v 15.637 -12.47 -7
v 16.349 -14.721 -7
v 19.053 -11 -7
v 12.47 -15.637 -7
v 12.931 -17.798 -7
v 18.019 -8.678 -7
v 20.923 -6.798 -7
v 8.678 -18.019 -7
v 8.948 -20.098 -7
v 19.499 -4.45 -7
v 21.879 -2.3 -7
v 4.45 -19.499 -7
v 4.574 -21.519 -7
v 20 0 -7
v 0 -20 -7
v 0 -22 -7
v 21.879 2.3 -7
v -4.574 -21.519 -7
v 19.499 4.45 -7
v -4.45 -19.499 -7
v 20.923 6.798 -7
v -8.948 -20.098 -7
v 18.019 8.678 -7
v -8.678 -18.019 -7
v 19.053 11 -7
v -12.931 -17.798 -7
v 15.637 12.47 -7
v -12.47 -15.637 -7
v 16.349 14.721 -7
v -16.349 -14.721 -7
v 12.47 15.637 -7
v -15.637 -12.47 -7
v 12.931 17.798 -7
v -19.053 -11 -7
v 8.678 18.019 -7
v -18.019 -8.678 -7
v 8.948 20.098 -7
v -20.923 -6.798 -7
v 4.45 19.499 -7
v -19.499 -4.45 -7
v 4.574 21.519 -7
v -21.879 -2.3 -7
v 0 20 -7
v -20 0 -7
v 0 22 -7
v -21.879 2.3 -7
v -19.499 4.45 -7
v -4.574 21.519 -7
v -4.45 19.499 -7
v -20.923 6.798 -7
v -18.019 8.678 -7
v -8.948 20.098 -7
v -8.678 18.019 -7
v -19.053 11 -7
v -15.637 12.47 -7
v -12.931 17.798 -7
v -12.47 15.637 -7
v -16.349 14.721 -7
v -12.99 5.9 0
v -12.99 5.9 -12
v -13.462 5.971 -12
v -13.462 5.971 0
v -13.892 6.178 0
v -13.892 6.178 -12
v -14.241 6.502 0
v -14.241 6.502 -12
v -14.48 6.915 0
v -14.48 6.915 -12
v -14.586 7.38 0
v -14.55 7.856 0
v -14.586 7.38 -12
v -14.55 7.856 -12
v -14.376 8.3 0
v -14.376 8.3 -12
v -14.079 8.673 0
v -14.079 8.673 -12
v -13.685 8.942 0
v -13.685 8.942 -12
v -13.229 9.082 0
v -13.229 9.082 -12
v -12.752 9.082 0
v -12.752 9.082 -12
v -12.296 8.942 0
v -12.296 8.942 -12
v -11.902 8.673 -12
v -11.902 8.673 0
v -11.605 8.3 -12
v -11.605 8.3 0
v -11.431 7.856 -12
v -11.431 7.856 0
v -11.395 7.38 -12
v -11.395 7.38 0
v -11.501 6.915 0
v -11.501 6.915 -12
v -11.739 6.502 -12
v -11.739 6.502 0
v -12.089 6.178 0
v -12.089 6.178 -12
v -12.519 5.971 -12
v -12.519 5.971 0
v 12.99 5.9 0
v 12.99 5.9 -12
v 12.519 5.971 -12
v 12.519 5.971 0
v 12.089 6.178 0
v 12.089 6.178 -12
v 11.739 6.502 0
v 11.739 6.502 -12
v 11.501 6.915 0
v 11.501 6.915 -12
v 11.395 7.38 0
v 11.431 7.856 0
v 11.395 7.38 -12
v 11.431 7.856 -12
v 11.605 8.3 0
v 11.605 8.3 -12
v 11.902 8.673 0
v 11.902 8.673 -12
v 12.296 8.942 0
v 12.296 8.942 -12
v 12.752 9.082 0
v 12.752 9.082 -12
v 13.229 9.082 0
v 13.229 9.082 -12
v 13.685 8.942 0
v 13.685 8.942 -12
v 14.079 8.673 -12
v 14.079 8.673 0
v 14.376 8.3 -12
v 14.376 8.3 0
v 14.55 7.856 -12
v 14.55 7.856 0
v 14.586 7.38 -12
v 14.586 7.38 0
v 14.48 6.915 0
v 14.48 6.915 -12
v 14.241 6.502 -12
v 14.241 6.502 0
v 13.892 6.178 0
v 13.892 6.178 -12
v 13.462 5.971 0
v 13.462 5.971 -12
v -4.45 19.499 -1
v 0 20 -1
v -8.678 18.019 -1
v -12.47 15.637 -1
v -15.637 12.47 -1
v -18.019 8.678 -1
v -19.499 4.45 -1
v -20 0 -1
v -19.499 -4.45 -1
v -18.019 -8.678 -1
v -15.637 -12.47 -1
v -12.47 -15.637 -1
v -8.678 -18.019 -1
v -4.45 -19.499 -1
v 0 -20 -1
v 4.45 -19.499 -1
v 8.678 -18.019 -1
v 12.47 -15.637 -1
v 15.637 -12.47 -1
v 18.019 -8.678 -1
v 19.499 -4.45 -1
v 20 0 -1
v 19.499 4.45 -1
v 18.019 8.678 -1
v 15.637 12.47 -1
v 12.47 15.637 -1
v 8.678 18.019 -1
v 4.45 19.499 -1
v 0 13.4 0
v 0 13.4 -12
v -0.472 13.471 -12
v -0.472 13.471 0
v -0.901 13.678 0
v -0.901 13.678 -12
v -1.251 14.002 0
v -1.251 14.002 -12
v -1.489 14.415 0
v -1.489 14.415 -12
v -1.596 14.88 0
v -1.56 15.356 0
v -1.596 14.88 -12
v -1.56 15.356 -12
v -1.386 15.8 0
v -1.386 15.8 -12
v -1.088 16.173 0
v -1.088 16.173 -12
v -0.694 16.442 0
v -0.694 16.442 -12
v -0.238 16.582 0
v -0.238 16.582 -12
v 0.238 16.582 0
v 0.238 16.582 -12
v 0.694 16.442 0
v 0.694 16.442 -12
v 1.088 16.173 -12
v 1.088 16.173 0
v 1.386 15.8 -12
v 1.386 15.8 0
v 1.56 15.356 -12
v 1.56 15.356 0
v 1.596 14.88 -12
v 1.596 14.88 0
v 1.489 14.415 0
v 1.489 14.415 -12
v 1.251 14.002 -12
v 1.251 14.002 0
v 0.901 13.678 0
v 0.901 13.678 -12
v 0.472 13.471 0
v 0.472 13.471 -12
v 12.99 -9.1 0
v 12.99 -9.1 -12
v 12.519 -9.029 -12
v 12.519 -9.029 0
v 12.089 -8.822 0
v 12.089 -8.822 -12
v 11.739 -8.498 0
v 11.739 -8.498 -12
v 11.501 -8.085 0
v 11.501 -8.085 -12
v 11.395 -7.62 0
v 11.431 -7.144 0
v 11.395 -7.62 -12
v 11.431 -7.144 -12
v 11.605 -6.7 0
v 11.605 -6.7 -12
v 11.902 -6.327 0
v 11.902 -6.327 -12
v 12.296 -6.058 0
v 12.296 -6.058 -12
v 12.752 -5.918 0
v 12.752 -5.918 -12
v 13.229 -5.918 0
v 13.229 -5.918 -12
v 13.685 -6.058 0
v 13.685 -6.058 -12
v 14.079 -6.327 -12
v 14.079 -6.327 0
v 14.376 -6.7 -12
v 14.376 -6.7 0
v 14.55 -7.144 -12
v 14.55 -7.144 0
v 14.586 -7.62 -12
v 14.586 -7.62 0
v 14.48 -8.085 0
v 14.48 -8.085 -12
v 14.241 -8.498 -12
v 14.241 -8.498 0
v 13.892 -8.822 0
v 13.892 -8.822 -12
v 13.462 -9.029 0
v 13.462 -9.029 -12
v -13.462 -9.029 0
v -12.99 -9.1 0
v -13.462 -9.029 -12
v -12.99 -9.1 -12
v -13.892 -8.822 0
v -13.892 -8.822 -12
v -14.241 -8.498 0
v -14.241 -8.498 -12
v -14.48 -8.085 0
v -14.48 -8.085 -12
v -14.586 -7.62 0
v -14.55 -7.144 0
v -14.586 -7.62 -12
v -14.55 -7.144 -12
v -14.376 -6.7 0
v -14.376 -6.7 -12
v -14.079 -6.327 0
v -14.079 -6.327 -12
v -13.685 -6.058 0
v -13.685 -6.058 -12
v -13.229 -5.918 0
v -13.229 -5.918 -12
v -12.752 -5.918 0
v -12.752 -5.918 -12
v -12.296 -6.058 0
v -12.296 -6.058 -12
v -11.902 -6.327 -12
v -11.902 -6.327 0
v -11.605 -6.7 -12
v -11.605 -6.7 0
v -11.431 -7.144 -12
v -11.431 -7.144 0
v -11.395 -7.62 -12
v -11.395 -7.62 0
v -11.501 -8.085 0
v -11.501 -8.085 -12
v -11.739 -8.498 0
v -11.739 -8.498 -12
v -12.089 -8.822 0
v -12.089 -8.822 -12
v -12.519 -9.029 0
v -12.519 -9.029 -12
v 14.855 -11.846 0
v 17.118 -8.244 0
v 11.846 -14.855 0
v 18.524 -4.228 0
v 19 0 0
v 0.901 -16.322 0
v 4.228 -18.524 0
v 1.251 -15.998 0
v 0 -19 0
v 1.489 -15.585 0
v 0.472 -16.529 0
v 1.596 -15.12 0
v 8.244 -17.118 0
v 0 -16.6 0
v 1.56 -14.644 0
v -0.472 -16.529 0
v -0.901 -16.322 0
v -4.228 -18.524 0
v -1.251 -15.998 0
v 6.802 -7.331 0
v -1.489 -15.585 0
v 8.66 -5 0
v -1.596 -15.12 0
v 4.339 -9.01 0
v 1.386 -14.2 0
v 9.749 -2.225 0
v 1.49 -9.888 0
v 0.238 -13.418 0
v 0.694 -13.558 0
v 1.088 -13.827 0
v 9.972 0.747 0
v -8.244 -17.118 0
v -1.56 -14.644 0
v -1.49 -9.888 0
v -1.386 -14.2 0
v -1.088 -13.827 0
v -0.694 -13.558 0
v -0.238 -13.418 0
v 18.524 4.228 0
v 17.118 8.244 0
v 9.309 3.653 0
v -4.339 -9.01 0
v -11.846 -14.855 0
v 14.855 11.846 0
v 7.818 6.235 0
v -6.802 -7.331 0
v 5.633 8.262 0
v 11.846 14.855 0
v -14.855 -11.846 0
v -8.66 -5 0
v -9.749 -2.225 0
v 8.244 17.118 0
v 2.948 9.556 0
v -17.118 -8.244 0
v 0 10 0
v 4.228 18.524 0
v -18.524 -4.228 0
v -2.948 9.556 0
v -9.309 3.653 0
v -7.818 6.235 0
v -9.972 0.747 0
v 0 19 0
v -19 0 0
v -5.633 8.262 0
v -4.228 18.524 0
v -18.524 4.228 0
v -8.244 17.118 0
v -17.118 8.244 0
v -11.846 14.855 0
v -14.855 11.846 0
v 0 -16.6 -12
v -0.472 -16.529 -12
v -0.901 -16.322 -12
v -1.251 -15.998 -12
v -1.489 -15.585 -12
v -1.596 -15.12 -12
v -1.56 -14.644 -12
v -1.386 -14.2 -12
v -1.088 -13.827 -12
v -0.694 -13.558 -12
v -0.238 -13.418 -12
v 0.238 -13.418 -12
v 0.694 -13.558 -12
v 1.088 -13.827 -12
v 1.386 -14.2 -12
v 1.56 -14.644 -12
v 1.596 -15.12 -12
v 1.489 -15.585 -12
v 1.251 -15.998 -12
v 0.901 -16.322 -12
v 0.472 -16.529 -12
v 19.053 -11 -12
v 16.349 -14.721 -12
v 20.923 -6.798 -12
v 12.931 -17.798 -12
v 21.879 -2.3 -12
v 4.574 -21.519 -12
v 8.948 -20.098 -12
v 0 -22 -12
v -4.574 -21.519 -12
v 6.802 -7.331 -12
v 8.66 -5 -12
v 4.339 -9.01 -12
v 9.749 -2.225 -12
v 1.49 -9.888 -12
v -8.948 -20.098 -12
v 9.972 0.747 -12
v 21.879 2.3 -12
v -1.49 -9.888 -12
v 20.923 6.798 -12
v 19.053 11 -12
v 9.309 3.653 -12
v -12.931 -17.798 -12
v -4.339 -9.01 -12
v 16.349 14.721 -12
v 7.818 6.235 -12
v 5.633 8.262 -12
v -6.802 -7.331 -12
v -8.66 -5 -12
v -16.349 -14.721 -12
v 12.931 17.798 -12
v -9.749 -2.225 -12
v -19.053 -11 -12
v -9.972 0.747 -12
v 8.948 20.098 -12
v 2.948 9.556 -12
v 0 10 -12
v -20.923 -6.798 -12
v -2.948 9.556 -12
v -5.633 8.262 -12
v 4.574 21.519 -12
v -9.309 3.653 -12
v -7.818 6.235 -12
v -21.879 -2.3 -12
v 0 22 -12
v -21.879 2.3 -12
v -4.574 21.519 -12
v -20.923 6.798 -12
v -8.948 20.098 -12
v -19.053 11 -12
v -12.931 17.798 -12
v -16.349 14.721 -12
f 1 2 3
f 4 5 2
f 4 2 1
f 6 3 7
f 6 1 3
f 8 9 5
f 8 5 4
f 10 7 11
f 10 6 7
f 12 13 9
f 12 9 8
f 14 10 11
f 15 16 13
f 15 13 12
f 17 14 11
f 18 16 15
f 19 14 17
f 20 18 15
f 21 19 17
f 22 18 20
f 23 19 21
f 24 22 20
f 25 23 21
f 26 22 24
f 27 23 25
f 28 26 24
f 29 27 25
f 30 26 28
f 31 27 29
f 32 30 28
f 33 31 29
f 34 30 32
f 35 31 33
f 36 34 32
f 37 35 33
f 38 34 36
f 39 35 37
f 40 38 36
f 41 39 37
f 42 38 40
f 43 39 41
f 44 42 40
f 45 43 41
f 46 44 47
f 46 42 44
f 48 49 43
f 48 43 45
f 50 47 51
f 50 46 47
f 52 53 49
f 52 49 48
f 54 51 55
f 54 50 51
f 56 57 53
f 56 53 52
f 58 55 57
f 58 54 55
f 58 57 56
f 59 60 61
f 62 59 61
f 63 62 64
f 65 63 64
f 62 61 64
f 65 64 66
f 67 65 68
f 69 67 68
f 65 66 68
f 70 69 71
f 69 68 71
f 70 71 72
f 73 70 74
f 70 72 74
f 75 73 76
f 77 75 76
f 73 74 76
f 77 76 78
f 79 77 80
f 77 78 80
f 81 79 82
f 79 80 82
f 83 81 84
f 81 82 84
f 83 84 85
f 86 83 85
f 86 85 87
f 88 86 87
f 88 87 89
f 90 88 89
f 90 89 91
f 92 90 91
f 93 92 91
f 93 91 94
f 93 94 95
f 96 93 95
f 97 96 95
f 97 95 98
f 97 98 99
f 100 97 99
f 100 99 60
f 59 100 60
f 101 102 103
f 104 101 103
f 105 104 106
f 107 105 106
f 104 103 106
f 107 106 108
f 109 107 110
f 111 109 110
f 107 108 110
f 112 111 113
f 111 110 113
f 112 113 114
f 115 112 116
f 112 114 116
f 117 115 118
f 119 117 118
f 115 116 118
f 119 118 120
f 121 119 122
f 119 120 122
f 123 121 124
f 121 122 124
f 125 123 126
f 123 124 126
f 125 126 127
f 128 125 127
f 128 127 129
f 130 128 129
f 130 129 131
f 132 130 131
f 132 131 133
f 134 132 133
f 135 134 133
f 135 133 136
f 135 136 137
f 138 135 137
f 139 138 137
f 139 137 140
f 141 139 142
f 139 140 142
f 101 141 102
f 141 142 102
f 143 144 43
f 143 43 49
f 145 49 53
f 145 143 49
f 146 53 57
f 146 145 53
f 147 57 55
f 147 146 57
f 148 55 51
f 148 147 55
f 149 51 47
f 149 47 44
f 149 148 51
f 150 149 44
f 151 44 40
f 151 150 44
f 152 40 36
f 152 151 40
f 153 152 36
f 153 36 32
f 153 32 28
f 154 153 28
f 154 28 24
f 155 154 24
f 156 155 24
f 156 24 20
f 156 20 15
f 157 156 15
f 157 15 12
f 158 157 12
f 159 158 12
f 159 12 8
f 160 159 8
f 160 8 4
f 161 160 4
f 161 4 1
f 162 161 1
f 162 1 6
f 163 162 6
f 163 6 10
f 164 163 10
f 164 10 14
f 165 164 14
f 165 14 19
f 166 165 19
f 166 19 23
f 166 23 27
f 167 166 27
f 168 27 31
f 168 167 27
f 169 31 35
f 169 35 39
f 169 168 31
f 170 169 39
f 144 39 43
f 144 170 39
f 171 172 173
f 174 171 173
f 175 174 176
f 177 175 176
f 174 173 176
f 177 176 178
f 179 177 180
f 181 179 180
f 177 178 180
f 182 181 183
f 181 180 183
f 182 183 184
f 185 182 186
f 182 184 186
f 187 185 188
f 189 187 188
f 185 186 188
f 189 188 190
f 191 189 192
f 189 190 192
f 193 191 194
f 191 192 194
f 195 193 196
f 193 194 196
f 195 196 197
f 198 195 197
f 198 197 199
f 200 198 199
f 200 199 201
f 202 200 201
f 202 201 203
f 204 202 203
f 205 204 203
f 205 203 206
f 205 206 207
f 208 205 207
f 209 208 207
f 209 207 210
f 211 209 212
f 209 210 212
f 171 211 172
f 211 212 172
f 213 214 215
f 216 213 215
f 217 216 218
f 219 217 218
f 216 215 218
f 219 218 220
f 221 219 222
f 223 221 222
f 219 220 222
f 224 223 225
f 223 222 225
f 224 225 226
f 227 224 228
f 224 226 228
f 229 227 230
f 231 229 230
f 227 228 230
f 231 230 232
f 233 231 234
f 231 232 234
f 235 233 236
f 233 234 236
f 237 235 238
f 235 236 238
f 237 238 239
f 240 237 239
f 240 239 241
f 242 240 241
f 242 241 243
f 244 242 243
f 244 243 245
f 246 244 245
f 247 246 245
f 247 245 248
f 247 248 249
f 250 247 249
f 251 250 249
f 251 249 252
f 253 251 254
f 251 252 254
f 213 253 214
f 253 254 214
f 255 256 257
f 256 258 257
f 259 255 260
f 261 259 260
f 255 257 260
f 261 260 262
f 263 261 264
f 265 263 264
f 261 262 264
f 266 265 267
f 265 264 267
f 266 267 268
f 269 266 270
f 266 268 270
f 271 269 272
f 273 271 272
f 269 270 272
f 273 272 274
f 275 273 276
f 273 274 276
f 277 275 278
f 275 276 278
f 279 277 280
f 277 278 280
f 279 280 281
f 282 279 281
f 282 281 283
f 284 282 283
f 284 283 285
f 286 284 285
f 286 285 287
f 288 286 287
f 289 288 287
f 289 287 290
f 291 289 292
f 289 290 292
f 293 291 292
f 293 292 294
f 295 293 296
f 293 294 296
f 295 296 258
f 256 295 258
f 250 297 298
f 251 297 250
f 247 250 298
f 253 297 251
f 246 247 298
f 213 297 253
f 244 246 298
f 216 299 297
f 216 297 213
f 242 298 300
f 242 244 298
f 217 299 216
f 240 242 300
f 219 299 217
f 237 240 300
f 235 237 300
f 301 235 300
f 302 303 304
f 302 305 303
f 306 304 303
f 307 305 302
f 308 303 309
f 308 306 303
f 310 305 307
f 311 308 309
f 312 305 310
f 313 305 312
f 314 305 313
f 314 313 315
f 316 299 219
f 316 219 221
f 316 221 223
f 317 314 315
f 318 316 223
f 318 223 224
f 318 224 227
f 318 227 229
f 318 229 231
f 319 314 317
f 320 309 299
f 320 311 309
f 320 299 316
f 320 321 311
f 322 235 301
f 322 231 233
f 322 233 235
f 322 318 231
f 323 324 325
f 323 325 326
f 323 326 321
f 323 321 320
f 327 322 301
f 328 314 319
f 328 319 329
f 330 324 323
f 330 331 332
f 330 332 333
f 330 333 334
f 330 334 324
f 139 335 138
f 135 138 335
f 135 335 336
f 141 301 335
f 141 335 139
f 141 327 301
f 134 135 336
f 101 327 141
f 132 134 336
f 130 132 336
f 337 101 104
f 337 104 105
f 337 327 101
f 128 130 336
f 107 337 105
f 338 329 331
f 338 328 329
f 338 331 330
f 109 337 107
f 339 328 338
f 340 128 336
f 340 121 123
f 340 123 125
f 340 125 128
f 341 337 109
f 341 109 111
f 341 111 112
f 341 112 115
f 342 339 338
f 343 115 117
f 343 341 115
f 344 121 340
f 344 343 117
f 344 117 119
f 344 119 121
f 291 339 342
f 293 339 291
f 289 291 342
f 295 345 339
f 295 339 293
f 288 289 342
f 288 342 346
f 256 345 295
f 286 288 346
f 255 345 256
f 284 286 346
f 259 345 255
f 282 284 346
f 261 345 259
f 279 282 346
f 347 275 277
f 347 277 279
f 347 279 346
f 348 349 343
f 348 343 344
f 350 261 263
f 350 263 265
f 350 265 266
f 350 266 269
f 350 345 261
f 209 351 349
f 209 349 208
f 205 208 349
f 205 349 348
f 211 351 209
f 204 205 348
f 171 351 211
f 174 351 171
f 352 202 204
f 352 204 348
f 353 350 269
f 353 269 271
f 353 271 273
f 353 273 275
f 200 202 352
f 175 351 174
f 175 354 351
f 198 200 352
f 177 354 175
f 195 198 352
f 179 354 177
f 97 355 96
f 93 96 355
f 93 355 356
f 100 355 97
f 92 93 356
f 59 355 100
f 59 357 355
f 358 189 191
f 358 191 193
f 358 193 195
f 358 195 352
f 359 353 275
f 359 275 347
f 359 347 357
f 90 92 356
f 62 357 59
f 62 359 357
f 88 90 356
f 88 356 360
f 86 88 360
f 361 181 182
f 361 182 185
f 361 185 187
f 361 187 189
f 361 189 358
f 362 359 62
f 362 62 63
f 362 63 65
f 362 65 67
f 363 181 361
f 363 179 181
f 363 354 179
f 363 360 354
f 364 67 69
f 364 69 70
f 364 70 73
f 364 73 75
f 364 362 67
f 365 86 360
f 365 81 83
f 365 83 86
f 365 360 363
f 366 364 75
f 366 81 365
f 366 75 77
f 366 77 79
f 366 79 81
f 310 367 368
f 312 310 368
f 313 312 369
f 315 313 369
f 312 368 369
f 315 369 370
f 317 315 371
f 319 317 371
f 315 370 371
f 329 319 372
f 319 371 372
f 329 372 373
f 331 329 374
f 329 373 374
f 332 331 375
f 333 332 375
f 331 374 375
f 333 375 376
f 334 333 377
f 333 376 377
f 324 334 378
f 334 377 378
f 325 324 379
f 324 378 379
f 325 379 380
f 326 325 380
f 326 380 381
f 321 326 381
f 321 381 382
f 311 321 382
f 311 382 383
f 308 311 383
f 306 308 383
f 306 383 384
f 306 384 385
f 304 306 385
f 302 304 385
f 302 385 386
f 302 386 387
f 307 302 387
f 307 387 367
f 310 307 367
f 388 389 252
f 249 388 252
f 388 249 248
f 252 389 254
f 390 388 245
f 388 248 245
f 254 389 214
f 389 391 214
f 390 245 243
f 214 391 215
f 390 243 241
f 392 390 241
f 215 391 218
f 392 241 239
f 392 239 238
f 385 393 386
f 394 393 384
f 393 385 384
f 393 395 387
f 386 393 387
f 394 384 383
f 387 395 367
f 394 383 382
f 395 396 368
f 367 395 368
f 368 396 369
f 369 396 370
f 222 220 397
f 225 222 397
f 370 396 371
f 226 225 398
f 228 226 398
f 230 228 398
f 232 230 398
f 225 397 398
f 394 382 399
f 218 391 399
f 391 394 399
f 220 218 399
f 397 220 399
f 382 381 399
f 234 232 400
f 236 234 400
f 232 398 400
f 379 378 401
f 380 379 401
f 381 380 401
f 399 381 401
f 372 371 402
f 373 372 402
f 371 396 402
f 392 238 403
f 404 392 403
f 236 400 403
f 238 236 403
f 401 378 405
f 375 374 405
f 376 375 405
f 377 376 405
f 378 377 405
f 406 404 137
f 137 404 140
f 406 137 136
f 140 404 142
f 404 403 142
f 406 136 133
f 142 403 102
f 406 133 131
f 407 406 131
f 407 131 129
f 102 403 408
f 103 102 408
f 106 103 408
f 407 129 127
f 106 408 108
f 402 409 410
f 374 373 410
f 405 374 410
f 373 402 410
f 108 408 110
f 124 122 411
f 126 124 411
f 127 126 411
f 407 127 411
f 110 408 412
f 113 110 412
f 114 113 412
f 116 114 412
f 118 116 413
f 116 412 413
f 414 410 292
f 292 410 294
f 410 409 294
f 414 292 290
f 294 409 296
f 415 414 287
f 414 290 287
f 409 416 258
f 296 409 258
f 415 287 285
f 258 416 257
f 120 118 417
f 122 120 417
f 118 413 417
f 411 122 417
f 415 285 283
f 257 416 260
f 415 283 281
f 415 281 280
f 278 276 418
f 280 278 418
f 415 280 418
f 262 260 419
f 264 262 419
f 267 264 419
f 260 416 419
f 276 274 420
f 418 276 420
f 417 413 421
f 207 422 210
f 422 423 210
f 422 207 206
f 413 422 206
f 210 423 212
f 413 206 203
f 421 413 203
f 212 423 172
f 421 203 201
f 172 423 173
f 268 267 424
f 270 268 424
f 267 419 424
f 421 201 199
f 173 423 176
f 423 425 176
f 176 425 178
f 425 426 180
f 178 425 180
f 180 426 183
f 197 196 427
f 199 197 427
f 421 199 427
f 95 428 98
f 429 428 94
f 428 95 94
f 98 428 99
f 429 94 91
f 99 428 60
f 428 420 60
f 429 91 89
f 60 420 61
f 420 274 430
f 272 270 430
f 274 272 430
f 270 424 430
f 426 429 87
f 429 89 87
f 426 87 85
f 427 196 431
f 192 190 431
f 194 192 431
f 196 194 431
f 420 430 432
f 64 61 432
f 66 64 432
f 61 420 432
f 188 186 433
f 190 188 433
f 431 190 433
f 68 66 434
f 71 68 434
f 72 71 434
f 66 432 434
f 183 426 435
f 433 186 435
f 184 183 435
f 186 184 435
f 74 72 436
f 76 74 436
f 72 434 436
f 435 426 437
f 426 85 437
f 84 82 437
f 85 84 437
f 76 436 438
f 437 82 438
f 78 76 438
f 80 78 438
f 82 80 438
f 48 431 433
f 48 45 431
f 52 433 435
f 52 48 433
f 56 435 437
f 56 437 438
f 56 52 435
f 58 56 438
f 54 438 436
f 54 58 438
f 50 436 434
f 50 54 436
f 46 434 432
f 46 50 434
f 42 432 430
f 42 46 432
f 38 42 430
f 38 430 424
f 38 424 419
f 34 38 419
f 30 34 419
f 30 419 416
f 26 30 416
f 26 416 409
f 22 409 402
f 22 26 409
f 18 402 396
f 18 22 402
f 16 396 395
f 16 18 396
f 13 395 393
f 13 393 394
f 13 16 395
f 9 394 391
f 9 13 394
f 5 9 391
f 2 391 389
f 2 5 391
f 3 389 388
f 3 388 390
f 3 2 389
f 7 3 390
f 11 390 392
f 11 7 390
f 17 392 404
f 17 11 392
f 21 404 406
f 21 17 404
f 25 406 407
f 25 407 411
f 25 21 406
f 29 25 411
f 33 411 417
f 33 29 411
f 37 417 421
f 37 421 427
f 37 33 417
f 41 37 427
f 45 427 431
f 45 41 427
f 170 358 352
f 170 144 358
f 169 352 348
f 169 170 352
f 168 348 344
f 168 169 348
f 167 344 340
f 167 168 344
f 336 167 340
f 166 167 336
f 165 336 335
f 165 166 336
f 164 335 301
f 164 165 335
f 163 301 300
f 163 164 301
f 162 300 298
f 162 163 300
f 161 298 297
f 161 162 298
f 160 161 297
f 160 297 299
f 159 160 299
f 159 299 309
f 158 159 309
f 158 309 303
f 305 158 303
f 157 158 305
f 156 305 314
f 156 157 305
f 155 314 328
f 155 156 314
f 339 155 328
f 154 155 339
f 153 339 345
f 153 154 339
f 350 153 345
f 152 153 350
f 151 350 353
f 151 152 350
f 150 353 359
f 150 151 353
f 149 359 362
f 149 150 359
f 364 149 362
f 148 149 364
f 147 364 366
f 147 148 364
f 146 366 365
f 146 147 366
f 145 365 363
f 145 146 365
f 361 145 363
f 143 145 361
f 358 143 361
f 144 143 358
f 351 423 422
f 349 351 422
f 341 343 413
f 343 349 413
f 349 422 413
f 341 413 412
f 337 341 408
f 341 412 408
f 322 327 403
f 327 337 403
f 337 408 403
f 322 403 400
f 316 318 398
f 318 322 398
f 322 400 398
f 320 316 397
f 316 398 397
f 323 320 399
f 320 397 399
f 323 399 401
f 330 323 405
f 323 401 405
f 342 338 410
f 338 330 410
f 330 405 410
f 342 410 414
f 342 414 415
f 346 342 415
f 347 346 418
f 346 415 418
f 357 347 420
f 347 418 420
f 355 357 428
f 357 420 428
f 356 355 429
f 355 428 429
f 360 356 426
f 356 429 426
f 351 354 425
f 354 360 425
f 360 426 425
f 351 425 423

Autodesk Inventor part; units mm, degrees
ref_plane "YZ Plane" through (0, 0, 0) normal (1, 0, 0) x (0, 1, 0)
ref_plane "XZ Plane" through (0, 0, 0) normal (0, 1, 0) x (-1, 0, 0)
ref_plane "XY Plane" through (0, 0, 0) normal (0, 0, 1) x (1, 0, 0)
sketch "スケッチ1" plane through (0, 0, 0) normal (1, 0, 0) x (0, 1, 0)
  line L0 (10, 0) -> (10, -12)
  line L1 (22, -12) -> (22, -7)
  line L2 (22, -7) -> (20, -7)
  line L3 (20, -7) -> (20, 0)
  line L4 (20, 0) -> (10, 0)
  line L5 (0, -14.4) -> (0, 2.4) projected
  line L6 (22, -12) -> (10, -12)
  point P0 (0, 0)
  dimension "d0" = 20
  dimension "d1" = 2
  dimension "d2" = 7
  dimension "d3" = 5
  dimension "d4" = 10
revolve "回転1" add sketch "スケッチ1" angle 360 about axis through (0, 0, -10) along (0, 0, 1)
sketch "スケッチ2" plane through (0, 0, 0) normal (0, 0, 1) x (1, 0, 0)
  circle A0 centre (0, 0) radius 20 projected
  circle A1 centre (0, 0) radius 15
  point P0 (0, 15)
  point P1 (-12.9904, 7.5)
  point P2 (-12.9904, -7.5)
  point P3 (0, -15)
  point P4 (12.9904, -7.5)
  point P5 (12.9904, 7.5)
  dimension "d8" = 5
  dimension "d11" = 360
hole "穴1" at (0, 15, 0) at (-12.9904, 7.5, 0) at (-12.9904, -7.5, 0) at (0, -15, 0) at (12.9904, -7.5, 0) at (12.9904, 7.5, 0) direction (0, 0, -1) diameter 3.2 end through all clearance for "Socket Head Cap Screw" size "M3" standard "Ansi Metric M Profile"
chamfer "面取り1" distance 1 angle 45 1 edges at (0, -20, 0)
properties part number "base1" material "ABS プラスチック"
